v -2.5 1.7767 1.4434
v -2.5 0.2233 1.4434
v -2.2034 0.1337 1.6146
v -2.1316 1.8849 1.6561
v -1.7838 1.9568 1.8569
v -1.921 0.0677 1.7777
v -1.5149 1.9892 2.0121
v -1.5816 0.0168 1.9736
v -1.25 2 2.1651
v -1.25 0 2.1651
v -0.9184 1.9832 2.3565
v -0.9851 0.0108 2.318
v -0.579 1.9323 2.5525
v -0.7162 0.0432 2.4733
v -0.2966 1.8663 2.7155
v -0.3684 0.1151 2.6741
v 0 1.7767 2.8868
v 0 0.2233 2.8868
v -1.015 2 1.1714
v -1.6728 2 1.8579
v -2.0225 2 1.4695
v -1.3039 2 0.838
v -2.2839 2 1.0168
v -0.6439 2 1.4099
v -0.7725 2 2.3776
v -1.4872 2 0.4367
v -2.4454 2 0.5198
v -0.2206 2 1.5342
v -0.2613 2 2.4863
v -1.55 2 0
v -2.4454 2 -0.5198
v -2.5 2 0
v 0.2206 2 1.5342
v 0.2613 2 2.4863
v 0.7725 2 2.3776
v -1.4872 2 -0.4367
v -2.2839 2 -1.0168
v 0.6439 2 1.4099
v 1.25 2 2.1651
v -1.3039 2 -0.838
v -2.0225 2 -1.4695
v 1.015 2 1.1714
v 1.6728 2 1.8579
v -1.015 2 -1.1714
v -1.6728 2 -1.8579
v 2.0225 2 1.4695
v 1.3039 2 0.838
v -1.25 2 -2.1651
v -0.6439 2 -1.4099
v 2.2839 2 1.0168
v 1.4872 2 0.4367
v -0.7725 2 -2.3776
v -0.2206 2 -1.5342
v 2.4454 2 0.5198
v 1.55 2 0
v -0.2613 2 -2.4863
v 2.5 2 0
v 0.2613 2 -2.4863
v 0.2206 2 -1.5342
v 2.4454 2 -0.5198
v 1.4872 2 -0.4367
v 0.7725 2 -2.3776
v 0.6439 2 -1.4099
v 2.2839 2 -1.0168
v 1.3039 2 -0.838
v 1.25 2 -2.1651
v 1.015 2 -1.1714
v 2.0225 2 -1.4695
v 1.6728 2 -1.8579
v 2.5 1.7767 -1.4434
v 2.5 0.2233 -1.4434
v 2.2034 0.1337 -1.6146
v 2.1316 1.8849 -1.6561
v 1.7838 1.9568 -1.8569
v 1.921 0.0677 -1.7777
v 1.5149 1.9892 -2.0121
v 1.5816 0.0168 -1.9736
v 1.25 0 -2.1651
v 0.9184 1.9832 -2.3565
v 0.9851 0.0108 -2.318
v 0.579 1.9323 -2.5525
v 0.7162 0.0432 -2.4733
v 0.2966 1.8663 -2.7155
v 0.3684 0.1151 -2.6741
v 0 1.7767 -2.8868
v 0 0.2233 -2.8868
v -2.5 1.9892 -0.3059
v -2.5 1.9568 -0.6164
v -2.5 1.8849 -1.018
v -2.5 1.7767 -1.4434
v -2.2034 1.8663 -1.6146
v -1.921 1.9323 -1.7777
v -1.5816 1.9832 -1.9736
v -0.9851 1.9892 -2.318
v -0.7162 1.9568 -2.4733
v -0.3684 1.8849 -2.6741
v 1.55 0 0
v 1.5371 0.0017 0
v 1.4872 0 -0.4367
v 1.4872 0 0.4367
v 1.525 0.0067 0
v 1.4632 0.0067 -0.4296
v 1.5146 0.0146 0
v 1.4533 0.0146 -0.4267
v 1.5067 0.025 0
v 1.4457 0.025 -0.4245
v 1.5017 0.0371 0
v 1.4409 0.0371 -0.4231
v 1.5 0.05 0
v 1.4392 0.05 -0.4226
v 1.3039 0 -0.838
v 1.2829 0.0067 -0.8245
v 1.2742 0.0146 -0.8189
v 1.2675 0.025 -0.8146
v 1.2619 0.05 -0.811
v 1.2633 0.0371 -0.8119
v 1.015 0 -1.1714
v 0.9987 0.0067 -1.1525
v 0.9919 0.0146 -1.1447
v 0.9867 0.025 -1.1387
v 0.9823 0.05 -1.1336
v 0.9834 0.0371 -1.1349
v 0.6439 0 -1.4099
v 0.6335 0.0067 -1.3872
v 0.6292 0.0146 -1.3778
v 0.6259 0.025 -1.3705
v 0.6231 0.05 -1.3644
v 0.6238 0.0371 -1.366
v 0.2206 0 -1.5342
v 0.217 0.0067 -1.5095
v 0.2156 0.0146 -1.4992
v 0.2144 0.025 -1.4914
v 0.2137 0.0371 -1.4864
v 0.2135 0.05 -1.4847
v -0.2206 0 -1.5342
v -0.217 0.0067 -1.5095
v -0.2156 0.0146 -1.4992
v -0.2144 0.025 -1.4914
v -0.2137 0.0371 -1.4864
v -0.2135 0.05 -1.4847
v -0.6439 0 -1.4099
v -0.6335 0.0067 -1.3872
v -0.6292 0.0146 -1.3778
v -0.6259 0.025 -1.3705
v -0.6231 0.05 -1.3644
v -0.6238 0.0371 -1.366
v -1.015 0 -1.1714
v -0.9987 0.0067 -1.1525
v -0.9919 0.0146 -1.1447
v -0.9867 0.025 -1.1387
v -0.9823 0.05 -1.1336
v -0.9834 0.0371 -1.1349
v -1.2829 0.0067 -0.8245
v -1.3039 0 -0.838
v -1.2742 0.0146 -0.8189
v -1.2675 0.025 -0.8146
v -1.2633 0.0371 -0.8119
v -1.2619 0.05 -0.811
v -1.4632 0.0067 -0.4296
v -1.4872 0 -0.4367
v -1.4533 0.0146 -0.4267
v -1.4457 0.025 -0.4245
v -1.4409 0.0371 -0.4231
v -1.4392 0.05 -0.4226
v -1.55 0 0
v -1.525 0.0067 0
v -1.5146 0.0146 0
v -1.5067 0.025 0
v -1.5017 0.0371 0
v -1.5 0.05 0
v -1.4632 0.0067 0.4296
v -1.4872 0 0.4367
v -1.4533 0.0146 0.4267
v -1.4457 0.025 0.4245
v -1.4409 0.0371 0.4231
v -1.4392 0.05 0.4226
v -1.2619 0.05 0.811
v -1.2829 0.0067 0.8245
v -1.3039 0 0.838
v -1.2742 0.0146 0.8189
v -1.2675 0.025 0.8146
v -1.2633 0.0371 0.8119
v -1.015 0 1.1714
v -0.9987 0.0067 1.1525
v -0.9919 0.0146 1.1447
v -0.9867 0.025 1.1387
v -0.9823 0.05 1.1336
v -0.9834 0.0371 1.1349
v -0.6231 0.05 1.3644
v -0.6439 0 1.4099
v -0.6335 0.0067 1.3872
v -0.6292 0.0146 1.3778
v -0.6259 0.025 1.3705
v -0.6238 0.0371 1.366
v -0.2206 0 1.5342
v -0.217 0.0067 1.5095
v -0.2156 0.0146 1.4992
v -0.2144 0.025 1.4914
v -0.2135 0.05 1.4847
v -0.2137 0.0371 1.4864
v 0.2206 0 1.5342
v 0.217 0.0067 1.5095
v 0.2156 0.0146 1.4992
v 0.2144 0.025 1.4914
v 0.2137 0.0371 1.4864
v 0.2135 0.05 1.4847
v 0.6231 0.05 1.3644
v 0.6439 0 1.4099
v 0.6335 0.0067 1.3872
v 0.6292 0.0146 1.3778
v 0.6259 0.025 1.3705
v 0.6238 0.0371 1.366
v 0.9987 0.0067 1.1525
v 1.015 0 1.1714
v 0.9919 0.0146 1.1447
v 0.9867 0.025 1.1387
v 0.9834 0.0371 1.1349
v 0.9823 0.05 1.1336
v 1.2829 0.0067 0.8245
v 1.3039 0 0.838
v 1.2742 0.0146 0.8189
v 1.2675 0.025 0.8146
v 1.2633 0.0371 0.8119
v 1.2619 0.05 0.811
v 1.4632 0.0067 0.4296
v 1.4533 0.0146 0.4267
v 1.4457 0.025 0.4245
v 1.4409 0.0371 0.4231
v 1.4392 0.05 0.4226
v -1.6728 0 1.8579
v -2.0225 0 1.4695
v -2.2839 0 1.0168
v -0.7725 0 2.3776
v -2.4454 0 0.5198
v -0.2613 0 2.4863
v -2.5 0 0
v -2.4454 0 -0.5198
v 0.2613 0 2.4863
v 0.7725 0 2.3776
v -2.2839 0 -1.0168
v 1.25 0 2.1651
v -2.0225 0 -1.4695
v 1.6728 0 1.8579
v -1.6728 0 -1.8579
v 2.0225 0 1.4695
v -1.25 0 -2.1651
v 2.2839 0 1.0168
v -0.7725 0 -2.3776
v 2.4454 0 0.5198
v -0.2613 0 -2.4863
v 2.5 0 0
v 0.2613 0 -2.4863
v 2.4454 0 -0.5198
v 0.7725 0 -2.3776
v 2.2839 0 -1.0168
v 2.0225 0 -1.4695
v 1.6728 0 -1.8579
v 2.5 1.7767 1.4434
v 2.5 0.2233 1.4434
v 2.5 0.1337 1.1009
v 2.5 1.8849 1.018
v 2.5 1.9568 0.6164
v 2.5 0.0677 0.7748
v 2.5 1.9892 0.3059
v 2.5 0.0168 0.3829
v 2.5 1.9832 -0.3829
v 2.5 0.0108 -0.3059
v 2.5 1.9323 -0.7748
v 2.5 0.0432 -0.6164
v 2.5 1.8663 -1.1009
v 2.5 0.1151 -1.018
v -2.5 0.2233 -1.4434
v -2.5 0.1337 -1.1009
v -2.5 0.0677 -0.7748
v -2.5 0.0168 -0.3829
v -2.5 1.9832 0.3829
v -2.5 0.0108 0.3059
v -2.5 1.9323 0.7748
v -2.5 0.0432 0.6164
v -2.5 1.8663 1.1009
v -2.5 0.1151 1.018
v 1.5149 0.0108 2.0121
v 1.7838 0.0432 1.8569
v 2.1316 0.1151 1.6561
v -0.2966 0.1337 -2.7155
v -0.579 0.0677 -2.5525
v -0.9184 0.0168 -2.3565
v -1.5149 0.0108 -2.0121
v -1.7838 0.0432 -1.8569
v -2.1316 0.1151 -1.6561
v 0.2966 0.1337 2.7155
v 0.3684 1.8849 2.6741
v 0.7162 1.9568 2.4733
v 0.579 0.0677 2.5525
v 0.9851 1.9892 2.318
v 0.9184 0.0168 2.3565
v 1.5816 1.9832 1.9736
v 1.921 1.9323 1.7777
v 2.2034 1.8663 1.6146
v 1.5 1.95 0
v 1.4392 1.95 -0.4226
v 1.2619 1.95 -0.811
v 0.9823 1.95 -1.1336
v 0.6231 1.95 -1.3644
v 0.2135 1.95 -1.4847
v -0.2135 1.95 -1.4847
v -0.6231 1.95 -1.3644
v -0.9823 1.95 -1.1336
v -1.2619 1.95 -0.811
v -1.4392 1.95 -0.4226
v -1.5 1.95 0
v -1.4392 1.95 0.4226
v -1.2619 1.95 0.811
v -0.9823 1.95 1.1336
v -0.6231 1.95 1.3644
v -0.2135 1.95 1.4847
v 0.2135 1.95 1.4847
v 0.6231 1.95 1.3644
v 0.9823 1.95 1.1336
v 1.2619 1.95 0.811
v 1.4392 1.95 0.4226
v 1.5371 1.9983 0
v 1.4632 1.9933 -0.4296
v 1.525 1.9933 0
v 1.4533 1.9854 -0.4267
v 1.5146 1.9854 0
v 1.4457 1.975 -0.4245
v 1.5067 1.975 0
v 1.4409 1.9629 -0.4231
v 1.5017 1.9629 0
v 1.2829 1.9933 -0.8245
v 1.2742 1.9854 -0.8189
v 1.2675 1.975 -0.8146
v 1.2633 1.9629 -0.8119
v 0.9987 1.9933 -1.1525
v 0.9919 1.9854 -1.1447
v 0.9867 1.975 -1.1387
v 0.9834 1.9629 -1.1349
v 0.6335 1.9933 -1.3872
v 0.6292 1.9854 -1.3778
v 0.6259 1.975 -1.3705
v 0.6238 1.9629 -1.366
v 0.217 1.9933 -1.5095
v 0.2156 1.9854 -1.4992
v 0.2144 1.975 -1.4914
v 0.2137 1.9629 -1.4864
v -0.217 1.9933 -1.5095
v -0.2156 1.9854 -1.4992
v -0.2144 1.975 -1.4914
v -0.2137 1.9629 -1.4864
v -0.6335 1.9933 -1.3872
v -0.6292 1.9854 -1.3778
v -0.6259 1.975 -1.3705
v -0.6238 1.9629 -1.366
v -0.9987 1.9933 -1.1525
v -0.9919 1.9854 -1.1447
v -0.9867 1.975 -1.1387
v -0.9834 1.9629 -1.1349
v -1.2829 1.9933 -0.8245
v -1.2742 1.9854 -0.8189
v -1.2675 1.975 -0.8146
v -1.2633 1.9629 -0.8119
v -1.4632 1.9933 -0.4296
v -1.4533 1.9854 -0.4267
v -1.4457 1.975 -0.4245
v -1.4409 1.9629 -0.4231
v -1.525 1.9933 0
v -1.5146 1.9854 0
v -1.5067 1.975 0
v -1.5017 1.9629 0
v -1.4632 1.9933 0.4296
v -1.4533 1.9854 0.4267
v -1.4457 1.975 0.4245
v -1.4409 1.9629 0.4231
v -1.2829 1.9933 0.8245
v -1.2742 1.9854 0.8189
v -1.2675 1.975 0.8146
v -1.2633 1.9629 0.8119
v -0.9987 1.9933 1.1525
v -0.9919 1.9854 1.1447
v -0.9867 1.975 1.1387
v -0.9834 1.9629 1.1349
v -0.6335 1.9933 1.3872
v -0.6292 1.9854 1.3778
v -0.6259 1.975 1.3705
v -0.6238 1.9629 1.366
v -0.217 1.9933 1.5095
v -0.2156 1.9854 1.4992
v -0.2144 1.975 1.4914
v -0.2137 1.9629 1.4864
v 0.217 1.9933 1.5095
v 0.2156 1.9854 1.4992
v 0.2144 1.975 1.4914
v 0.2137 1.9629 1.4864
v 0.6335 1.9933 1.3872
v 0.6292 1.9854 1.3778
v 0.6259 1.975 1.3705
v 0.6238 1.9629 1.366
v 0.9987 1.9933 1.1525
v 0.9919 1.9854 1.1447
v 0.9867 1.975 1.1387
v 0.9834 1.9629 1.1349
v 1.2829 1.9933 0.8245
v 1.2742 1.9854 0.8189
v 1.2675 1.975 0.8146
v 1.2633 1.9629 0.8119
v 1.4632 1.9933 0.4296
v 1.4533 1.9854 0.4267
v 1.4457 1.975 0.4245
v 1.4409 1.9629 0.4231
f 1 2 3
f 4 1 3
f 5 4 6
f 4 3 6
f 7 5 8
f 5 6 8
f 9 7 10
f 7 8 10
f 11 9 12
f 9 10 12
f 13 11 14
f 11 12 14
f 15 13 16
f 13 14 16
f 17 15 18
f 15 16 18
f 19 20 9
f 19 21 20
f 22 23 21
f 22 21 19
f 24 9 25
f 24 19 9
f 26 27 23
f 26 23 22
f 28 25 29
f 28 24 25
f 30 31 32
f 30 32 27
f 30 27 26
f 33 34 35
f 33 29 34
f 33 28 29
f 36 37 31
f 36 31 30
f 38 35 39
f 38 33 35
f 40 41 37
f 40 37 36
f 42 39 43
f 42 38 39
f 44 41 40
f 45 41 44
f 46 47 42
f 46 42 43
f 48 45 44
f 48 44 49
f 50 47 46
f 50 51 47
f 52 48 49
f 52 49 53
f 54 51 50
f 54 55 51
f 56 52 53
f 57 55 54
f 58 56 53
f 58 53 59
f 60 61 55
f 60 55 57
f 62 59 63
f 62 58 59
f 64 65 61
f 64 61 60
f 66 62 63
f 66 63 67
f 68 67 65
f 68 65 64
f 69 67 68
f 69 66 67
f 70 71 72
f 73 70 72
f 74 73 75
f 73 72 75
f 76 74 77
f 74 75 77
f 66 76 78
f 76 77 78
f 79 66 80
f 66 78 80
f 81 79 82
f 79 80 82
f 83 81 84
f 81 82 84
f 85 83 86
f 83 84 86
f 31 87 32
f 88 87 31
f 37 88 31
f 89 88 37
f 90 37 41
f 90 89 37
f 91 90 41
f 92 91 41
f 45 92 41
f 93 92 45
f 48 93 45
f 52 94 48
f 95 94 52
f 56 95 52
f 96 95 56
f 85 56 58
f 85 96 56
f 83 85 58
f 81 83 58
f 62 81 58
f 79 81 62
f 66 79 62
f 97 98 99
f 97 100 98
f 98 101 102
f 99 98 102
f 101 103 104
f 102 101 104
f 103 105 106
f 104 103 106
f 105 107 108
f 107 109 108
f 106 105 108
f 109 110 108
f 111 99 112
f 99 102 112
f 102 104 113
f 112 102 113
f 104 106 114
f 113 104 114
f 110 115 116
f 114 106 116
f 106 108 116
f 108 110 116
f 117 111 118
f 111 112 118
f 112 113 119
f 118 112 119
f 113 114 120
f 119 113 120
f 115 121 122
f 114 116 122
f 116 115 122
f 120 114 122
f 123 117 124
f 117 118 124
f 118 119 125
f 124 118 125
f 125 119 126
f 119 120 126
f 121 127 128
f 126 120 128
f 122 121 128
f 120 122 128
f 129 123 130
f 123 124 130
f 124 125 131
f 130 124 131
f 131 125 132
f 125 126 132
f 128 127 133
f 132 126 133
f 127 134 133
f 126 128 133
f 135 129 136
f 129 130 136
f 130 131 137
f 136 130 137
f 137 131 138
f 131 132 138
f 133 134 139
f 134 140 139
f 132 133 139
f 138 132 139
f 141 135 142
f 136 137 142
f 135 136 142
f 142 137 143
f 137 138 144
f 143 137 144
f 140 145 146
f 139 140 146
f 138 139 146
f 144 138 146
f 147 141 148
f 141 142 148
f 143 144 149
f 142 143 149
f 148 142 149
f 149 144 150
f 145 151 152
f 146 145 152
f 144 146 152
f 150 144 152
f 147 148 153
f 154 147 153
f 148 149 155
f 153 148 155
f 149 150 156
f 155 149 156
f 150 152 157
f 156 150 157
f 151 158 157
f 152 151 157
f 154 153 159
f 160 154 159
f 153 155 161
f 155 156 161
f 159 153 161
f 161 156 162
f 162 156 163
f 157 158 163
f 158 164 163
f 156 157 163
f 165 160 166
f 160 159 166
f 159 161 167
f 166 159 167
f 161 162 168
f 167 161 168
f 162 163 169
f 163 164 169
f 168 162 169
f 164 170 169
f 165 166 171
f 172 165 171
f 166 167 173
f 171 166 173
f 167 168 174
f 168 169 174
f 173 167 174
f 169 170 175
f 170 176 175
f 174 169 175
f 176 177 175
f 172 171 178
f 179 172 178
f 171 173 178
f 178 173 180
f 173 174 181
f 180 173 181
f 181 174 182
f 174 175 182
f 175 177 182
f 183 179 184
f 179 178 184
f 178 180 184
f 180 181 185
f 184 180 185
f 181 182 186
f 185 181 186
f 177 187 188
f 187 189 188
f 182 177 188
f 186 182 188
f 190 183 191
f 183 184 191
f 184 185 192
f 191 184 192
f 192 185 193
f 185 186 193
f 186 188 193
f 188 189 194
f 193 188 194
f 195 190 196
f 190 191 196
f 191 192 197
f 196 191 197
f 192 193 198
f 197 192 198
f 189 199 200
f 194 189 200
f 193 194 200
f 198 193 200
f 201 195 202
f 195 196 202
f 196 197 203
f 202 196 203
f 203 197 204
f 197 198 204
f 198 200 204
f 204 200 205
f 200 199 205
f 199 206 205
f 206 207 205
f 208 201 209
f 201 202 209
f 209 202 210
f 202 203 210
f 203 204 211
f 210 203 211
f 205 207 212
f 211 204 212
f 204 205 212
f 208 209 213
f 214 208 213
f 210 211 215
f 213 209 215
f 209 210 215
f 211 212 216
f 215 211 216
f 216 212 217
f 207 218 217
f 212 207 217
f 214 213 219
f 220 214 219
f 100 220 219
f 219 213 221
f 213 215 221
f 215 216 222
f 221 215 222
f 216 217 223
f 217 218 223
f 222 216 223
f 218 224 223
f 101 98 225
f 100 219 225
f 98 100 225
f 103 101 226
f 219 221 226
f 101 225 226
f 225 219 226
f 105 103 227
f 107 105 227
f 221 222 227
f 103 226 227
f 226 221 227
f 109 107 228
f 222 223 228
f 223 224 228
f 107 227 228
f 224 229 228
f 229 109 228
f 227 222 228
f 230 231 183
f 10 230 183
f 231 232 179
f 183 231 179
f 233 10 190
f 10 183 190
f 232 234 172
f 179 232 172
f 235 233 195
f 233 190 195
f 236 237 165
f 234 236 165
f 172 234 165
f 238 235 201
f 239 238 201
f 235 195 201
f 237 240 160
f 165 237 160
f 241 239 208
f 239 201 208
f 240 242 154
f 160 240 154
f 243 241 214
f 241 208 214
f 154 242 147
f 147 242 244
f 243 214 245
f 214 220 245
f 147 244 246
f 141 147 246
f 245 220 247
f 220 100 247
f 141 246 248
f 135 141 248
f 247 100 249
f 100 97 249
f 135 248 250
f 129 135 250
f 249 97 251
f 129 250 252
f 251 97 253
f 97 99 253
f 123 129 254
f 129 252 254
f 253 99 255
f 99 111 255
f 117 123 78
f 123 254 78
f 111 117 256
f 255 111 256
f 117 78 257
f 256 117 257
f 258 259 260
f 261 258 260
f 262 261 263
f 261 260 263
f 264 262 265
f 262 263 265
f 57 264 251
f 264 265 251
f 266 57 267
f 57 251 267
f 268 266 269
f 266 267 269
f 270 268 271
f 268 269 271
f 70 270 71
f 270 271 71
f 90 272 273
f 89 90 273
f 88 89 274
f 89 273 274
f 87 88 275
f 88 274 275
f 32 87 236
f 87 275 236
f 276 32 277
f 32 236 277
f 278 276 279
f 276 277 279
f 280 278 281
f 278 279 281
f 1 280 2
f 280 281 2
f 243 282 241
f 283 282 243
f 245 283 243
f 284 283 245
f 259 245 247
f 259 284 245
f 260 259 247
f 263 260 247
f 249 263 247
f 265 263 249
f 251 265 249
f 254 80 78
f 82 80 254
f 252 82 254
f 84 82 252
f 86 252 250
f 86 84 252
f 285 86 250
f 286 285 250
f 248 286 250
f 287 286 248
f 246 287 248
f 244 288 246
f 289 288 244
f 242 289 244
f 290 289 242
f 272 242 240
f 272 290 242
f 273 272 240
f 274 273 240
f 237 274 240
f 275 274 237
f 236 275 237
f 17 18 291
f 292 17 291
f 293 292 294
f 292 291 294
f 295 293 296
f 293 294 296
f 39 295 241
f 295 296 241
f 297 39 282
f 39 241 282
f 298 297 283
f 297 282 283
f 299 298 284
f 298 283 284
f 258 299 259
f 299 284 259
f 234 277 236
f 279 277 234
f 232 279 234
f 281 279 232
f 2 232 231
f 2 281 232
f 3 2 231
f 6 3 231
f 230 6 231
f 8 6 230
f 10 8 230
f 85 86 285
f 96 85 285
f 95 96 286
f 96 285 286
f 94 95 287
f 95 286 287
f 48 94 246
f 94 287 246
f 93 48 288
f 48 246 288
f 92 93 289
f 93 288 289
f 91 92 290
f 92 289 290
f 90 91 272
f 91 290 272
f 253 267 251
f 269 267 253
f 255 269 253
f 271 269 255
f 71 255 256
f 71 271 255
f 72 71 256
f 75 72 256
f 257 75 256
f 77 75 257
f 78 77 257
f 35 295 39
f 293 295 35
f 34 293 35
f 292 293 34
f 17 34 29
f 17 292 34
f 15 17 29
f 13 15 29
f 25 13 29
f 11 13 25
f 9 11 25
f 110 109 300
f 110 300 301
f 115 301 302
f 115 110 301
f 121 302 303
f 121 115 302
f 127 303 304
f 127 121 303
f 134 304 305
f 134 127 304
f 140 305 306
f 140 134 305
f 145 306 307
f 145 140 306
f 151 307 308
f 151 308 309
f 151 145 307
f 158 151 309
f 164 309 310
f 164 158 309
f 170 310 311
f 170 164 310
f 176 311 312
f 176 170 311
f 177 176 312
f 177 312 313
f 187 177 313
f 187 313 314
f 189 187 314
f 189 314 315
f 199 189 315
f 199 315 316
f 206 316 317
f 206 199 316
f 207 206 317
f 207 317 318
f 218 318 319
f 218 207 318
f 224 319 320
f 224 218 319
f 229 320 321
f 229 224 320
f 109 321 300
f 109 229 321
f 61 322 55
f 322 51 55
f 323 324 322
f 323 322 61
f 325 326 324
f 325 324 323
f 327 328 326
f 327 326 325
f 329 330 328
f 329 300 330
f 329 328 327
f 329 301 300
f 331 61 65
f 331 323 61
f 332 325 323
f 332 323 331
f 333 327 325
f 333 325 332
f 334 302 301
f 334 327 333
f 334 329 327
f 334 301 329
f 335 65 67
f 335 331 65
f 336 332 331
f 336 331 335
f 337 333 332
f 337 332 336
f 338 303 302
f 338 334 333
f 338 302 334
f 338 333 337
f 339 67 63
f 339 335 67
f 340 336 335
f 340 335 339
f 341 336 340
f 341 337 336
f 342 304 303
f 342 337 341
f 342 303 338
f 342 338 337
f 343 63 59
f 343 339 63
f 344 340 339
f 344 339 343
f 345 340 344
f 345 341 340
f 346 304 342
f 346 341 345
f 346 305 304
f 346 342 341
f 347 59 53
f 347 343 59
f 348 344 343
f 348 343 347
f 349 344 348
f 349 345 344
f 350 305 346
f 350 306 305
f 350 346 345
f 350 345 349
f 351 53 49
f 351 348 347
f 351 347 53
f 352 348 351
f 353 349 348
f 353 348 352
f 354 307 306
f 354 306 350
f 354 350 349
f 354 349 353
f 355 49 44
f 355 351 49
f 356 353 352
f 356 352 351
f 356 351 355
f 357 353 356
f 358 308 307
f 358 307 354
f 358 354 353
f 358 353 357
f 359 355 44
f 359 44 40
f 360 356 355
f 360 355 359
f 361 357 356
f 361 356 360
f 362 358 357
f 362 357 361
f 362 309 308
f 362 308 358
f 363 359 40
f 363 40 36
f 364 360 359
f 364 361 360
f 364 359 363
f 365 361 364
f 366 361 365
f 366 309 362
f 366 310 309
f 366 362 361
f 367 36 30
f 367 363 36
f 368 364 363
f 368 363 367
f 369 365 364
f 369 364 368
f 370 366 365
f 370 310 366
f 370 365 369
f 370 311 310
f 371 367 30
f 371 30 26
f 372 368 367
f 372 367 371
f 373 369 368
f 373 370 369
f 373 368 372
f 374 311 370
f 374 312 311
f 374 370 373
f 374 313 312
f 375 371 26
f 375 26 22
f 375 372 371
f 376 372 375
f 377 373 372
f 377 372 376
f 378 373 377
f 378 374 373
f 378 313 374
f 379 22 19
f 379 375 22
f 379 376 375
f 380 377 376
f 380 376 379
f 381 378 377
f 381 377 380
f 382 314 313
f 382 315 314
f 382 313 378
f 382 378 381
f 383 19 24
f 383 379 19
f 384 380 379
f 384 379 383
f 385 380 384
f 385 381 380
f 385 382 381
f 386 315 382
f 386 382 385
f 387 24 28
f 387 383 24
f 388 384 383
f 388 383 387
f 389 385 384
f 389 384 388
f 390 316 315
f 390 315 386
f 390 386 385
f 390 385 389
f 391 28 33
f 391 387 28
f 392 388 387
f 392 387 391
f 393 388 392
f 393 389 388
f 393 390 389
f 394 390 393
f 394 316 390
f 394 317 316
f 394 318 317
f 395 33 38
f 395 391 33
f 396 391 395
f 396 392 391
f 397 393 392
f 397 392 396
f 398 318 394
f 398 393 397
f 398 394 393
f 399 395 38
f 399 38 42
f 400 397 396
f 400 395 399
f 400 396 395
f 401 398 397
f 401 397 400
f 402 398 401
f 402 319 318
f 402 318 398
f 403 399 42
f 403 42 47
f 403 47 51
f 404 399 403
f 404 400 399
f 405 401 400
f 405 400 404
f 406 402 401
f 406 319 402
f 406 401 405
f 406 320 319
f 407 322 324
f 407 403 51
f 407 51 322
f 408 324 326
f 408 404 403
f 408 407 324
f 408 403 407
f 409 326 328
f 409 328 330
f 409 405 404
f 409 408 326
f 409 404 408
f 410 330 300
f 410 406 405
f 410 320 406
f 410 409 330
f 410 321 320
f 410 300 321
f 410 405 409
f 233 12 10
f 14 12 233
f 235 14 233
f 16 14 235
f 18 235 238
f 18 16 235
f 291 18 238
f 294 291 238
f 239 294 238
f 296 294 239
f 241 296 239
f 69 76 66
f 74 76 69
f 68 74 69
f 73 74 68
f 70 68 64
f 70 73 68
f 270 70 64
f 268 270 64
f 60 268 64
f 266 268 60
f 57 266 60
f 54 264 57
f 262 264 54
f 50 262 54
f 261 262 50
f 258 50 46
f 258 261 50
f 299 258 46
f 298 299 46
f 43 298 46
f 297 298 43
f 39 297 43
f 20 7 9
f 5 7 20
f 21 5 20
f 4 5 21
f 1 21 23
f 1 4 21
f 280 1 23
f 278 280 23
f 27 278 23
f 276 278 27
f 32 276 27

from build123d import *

# Parameters (mm, degrees)
SKETCH2_R           = 1.5
BOSS_EXTRUDE1_DEPTH = 2
SKETCH3_OUTSIDE_W   = 15.508
SKETCH3_OUTSIDE_H   = 16.282
SKETCH3_OUTSIDE_R   = 2.5
CUT_EXTRUDE1_DEPTH  = 2
CUT_EXTRUDE1_TAPER  = 60
SKETCH4_OUTSIDE_W   = 15.508
SKETCH4_OUTSIDE_H   = 16.282
SKETCH4_OUTSIDE_R   = 2.5
CUT_EXTRUDE2_DEPTH  = 2
CUT_EXTRUDE2_TAPER  = 60
FILLET1_R           = 0.05


with BuildPart() as part:
    # Sketch2 → Boss-Extrude1 (new body)
    with BuildSketch(Plane(origin=(0, 0, 0), x_dir=(1, 0, 0), z_dir=(0, 1, 0))):
        Polygon((2.5, -1.443375673), (2.5, 1.443375673), (0, 2.886751346), (-2.5, 1.443375673), (-2.5, -1.443375673), (0, -2.886751346), align=None)
        Circle(SKETCH2_R, mode=Mode.SUBTRACT)
    extrude(amount=BOSS_EXTRUDE1_DEPTH)

    # Sketch3 outside → Cut-Extrude1 (cut)
    with BuildSketch(Plane(origin=(0, 2, 0), x_dir=(1, 0, 0), z_dir=(0, 1, 0))):
        Rectangle(SKETCH3_OUTSIDE_W, SKETCH3_OUTSIDE_H)
        Circle(SKETCH3_OUTSIDE_R, mode=Mode.SUBTRACT)
    extrude(amount=-CUT_EXTRUDE1_DEPTH, taper=CUT_EXTRUDE1_TAPER, mode=Mode.SUBTRACT)

    # Sketch4 outside → Cut-Extrude2 (cut)
    with BuildSketch(Plane.XZ):
        Rectangle(SKETCH4_OUTSIDE_W, SKETCH4_OUTSIDE_H)
        Circle(SKETCH4_OUTSIDE_R, mode=Mode.SUBTRACT)
    extrude(amount=-CUT_EXTRUDE2_DEPTH, taper=CUT_EXTRUDE2_TAPER, mode=Mode.SUBTRACT)

    # Fillet1
    fillet1_edges = [part.edges().sort_by_distance(p)[0] for p in [
        (-1.5, 0, 0),
        (-1.5, 2, 0),
    ]]
    fillet(fillet1_edges, radius=FILLET1_R)


solid = part.part
